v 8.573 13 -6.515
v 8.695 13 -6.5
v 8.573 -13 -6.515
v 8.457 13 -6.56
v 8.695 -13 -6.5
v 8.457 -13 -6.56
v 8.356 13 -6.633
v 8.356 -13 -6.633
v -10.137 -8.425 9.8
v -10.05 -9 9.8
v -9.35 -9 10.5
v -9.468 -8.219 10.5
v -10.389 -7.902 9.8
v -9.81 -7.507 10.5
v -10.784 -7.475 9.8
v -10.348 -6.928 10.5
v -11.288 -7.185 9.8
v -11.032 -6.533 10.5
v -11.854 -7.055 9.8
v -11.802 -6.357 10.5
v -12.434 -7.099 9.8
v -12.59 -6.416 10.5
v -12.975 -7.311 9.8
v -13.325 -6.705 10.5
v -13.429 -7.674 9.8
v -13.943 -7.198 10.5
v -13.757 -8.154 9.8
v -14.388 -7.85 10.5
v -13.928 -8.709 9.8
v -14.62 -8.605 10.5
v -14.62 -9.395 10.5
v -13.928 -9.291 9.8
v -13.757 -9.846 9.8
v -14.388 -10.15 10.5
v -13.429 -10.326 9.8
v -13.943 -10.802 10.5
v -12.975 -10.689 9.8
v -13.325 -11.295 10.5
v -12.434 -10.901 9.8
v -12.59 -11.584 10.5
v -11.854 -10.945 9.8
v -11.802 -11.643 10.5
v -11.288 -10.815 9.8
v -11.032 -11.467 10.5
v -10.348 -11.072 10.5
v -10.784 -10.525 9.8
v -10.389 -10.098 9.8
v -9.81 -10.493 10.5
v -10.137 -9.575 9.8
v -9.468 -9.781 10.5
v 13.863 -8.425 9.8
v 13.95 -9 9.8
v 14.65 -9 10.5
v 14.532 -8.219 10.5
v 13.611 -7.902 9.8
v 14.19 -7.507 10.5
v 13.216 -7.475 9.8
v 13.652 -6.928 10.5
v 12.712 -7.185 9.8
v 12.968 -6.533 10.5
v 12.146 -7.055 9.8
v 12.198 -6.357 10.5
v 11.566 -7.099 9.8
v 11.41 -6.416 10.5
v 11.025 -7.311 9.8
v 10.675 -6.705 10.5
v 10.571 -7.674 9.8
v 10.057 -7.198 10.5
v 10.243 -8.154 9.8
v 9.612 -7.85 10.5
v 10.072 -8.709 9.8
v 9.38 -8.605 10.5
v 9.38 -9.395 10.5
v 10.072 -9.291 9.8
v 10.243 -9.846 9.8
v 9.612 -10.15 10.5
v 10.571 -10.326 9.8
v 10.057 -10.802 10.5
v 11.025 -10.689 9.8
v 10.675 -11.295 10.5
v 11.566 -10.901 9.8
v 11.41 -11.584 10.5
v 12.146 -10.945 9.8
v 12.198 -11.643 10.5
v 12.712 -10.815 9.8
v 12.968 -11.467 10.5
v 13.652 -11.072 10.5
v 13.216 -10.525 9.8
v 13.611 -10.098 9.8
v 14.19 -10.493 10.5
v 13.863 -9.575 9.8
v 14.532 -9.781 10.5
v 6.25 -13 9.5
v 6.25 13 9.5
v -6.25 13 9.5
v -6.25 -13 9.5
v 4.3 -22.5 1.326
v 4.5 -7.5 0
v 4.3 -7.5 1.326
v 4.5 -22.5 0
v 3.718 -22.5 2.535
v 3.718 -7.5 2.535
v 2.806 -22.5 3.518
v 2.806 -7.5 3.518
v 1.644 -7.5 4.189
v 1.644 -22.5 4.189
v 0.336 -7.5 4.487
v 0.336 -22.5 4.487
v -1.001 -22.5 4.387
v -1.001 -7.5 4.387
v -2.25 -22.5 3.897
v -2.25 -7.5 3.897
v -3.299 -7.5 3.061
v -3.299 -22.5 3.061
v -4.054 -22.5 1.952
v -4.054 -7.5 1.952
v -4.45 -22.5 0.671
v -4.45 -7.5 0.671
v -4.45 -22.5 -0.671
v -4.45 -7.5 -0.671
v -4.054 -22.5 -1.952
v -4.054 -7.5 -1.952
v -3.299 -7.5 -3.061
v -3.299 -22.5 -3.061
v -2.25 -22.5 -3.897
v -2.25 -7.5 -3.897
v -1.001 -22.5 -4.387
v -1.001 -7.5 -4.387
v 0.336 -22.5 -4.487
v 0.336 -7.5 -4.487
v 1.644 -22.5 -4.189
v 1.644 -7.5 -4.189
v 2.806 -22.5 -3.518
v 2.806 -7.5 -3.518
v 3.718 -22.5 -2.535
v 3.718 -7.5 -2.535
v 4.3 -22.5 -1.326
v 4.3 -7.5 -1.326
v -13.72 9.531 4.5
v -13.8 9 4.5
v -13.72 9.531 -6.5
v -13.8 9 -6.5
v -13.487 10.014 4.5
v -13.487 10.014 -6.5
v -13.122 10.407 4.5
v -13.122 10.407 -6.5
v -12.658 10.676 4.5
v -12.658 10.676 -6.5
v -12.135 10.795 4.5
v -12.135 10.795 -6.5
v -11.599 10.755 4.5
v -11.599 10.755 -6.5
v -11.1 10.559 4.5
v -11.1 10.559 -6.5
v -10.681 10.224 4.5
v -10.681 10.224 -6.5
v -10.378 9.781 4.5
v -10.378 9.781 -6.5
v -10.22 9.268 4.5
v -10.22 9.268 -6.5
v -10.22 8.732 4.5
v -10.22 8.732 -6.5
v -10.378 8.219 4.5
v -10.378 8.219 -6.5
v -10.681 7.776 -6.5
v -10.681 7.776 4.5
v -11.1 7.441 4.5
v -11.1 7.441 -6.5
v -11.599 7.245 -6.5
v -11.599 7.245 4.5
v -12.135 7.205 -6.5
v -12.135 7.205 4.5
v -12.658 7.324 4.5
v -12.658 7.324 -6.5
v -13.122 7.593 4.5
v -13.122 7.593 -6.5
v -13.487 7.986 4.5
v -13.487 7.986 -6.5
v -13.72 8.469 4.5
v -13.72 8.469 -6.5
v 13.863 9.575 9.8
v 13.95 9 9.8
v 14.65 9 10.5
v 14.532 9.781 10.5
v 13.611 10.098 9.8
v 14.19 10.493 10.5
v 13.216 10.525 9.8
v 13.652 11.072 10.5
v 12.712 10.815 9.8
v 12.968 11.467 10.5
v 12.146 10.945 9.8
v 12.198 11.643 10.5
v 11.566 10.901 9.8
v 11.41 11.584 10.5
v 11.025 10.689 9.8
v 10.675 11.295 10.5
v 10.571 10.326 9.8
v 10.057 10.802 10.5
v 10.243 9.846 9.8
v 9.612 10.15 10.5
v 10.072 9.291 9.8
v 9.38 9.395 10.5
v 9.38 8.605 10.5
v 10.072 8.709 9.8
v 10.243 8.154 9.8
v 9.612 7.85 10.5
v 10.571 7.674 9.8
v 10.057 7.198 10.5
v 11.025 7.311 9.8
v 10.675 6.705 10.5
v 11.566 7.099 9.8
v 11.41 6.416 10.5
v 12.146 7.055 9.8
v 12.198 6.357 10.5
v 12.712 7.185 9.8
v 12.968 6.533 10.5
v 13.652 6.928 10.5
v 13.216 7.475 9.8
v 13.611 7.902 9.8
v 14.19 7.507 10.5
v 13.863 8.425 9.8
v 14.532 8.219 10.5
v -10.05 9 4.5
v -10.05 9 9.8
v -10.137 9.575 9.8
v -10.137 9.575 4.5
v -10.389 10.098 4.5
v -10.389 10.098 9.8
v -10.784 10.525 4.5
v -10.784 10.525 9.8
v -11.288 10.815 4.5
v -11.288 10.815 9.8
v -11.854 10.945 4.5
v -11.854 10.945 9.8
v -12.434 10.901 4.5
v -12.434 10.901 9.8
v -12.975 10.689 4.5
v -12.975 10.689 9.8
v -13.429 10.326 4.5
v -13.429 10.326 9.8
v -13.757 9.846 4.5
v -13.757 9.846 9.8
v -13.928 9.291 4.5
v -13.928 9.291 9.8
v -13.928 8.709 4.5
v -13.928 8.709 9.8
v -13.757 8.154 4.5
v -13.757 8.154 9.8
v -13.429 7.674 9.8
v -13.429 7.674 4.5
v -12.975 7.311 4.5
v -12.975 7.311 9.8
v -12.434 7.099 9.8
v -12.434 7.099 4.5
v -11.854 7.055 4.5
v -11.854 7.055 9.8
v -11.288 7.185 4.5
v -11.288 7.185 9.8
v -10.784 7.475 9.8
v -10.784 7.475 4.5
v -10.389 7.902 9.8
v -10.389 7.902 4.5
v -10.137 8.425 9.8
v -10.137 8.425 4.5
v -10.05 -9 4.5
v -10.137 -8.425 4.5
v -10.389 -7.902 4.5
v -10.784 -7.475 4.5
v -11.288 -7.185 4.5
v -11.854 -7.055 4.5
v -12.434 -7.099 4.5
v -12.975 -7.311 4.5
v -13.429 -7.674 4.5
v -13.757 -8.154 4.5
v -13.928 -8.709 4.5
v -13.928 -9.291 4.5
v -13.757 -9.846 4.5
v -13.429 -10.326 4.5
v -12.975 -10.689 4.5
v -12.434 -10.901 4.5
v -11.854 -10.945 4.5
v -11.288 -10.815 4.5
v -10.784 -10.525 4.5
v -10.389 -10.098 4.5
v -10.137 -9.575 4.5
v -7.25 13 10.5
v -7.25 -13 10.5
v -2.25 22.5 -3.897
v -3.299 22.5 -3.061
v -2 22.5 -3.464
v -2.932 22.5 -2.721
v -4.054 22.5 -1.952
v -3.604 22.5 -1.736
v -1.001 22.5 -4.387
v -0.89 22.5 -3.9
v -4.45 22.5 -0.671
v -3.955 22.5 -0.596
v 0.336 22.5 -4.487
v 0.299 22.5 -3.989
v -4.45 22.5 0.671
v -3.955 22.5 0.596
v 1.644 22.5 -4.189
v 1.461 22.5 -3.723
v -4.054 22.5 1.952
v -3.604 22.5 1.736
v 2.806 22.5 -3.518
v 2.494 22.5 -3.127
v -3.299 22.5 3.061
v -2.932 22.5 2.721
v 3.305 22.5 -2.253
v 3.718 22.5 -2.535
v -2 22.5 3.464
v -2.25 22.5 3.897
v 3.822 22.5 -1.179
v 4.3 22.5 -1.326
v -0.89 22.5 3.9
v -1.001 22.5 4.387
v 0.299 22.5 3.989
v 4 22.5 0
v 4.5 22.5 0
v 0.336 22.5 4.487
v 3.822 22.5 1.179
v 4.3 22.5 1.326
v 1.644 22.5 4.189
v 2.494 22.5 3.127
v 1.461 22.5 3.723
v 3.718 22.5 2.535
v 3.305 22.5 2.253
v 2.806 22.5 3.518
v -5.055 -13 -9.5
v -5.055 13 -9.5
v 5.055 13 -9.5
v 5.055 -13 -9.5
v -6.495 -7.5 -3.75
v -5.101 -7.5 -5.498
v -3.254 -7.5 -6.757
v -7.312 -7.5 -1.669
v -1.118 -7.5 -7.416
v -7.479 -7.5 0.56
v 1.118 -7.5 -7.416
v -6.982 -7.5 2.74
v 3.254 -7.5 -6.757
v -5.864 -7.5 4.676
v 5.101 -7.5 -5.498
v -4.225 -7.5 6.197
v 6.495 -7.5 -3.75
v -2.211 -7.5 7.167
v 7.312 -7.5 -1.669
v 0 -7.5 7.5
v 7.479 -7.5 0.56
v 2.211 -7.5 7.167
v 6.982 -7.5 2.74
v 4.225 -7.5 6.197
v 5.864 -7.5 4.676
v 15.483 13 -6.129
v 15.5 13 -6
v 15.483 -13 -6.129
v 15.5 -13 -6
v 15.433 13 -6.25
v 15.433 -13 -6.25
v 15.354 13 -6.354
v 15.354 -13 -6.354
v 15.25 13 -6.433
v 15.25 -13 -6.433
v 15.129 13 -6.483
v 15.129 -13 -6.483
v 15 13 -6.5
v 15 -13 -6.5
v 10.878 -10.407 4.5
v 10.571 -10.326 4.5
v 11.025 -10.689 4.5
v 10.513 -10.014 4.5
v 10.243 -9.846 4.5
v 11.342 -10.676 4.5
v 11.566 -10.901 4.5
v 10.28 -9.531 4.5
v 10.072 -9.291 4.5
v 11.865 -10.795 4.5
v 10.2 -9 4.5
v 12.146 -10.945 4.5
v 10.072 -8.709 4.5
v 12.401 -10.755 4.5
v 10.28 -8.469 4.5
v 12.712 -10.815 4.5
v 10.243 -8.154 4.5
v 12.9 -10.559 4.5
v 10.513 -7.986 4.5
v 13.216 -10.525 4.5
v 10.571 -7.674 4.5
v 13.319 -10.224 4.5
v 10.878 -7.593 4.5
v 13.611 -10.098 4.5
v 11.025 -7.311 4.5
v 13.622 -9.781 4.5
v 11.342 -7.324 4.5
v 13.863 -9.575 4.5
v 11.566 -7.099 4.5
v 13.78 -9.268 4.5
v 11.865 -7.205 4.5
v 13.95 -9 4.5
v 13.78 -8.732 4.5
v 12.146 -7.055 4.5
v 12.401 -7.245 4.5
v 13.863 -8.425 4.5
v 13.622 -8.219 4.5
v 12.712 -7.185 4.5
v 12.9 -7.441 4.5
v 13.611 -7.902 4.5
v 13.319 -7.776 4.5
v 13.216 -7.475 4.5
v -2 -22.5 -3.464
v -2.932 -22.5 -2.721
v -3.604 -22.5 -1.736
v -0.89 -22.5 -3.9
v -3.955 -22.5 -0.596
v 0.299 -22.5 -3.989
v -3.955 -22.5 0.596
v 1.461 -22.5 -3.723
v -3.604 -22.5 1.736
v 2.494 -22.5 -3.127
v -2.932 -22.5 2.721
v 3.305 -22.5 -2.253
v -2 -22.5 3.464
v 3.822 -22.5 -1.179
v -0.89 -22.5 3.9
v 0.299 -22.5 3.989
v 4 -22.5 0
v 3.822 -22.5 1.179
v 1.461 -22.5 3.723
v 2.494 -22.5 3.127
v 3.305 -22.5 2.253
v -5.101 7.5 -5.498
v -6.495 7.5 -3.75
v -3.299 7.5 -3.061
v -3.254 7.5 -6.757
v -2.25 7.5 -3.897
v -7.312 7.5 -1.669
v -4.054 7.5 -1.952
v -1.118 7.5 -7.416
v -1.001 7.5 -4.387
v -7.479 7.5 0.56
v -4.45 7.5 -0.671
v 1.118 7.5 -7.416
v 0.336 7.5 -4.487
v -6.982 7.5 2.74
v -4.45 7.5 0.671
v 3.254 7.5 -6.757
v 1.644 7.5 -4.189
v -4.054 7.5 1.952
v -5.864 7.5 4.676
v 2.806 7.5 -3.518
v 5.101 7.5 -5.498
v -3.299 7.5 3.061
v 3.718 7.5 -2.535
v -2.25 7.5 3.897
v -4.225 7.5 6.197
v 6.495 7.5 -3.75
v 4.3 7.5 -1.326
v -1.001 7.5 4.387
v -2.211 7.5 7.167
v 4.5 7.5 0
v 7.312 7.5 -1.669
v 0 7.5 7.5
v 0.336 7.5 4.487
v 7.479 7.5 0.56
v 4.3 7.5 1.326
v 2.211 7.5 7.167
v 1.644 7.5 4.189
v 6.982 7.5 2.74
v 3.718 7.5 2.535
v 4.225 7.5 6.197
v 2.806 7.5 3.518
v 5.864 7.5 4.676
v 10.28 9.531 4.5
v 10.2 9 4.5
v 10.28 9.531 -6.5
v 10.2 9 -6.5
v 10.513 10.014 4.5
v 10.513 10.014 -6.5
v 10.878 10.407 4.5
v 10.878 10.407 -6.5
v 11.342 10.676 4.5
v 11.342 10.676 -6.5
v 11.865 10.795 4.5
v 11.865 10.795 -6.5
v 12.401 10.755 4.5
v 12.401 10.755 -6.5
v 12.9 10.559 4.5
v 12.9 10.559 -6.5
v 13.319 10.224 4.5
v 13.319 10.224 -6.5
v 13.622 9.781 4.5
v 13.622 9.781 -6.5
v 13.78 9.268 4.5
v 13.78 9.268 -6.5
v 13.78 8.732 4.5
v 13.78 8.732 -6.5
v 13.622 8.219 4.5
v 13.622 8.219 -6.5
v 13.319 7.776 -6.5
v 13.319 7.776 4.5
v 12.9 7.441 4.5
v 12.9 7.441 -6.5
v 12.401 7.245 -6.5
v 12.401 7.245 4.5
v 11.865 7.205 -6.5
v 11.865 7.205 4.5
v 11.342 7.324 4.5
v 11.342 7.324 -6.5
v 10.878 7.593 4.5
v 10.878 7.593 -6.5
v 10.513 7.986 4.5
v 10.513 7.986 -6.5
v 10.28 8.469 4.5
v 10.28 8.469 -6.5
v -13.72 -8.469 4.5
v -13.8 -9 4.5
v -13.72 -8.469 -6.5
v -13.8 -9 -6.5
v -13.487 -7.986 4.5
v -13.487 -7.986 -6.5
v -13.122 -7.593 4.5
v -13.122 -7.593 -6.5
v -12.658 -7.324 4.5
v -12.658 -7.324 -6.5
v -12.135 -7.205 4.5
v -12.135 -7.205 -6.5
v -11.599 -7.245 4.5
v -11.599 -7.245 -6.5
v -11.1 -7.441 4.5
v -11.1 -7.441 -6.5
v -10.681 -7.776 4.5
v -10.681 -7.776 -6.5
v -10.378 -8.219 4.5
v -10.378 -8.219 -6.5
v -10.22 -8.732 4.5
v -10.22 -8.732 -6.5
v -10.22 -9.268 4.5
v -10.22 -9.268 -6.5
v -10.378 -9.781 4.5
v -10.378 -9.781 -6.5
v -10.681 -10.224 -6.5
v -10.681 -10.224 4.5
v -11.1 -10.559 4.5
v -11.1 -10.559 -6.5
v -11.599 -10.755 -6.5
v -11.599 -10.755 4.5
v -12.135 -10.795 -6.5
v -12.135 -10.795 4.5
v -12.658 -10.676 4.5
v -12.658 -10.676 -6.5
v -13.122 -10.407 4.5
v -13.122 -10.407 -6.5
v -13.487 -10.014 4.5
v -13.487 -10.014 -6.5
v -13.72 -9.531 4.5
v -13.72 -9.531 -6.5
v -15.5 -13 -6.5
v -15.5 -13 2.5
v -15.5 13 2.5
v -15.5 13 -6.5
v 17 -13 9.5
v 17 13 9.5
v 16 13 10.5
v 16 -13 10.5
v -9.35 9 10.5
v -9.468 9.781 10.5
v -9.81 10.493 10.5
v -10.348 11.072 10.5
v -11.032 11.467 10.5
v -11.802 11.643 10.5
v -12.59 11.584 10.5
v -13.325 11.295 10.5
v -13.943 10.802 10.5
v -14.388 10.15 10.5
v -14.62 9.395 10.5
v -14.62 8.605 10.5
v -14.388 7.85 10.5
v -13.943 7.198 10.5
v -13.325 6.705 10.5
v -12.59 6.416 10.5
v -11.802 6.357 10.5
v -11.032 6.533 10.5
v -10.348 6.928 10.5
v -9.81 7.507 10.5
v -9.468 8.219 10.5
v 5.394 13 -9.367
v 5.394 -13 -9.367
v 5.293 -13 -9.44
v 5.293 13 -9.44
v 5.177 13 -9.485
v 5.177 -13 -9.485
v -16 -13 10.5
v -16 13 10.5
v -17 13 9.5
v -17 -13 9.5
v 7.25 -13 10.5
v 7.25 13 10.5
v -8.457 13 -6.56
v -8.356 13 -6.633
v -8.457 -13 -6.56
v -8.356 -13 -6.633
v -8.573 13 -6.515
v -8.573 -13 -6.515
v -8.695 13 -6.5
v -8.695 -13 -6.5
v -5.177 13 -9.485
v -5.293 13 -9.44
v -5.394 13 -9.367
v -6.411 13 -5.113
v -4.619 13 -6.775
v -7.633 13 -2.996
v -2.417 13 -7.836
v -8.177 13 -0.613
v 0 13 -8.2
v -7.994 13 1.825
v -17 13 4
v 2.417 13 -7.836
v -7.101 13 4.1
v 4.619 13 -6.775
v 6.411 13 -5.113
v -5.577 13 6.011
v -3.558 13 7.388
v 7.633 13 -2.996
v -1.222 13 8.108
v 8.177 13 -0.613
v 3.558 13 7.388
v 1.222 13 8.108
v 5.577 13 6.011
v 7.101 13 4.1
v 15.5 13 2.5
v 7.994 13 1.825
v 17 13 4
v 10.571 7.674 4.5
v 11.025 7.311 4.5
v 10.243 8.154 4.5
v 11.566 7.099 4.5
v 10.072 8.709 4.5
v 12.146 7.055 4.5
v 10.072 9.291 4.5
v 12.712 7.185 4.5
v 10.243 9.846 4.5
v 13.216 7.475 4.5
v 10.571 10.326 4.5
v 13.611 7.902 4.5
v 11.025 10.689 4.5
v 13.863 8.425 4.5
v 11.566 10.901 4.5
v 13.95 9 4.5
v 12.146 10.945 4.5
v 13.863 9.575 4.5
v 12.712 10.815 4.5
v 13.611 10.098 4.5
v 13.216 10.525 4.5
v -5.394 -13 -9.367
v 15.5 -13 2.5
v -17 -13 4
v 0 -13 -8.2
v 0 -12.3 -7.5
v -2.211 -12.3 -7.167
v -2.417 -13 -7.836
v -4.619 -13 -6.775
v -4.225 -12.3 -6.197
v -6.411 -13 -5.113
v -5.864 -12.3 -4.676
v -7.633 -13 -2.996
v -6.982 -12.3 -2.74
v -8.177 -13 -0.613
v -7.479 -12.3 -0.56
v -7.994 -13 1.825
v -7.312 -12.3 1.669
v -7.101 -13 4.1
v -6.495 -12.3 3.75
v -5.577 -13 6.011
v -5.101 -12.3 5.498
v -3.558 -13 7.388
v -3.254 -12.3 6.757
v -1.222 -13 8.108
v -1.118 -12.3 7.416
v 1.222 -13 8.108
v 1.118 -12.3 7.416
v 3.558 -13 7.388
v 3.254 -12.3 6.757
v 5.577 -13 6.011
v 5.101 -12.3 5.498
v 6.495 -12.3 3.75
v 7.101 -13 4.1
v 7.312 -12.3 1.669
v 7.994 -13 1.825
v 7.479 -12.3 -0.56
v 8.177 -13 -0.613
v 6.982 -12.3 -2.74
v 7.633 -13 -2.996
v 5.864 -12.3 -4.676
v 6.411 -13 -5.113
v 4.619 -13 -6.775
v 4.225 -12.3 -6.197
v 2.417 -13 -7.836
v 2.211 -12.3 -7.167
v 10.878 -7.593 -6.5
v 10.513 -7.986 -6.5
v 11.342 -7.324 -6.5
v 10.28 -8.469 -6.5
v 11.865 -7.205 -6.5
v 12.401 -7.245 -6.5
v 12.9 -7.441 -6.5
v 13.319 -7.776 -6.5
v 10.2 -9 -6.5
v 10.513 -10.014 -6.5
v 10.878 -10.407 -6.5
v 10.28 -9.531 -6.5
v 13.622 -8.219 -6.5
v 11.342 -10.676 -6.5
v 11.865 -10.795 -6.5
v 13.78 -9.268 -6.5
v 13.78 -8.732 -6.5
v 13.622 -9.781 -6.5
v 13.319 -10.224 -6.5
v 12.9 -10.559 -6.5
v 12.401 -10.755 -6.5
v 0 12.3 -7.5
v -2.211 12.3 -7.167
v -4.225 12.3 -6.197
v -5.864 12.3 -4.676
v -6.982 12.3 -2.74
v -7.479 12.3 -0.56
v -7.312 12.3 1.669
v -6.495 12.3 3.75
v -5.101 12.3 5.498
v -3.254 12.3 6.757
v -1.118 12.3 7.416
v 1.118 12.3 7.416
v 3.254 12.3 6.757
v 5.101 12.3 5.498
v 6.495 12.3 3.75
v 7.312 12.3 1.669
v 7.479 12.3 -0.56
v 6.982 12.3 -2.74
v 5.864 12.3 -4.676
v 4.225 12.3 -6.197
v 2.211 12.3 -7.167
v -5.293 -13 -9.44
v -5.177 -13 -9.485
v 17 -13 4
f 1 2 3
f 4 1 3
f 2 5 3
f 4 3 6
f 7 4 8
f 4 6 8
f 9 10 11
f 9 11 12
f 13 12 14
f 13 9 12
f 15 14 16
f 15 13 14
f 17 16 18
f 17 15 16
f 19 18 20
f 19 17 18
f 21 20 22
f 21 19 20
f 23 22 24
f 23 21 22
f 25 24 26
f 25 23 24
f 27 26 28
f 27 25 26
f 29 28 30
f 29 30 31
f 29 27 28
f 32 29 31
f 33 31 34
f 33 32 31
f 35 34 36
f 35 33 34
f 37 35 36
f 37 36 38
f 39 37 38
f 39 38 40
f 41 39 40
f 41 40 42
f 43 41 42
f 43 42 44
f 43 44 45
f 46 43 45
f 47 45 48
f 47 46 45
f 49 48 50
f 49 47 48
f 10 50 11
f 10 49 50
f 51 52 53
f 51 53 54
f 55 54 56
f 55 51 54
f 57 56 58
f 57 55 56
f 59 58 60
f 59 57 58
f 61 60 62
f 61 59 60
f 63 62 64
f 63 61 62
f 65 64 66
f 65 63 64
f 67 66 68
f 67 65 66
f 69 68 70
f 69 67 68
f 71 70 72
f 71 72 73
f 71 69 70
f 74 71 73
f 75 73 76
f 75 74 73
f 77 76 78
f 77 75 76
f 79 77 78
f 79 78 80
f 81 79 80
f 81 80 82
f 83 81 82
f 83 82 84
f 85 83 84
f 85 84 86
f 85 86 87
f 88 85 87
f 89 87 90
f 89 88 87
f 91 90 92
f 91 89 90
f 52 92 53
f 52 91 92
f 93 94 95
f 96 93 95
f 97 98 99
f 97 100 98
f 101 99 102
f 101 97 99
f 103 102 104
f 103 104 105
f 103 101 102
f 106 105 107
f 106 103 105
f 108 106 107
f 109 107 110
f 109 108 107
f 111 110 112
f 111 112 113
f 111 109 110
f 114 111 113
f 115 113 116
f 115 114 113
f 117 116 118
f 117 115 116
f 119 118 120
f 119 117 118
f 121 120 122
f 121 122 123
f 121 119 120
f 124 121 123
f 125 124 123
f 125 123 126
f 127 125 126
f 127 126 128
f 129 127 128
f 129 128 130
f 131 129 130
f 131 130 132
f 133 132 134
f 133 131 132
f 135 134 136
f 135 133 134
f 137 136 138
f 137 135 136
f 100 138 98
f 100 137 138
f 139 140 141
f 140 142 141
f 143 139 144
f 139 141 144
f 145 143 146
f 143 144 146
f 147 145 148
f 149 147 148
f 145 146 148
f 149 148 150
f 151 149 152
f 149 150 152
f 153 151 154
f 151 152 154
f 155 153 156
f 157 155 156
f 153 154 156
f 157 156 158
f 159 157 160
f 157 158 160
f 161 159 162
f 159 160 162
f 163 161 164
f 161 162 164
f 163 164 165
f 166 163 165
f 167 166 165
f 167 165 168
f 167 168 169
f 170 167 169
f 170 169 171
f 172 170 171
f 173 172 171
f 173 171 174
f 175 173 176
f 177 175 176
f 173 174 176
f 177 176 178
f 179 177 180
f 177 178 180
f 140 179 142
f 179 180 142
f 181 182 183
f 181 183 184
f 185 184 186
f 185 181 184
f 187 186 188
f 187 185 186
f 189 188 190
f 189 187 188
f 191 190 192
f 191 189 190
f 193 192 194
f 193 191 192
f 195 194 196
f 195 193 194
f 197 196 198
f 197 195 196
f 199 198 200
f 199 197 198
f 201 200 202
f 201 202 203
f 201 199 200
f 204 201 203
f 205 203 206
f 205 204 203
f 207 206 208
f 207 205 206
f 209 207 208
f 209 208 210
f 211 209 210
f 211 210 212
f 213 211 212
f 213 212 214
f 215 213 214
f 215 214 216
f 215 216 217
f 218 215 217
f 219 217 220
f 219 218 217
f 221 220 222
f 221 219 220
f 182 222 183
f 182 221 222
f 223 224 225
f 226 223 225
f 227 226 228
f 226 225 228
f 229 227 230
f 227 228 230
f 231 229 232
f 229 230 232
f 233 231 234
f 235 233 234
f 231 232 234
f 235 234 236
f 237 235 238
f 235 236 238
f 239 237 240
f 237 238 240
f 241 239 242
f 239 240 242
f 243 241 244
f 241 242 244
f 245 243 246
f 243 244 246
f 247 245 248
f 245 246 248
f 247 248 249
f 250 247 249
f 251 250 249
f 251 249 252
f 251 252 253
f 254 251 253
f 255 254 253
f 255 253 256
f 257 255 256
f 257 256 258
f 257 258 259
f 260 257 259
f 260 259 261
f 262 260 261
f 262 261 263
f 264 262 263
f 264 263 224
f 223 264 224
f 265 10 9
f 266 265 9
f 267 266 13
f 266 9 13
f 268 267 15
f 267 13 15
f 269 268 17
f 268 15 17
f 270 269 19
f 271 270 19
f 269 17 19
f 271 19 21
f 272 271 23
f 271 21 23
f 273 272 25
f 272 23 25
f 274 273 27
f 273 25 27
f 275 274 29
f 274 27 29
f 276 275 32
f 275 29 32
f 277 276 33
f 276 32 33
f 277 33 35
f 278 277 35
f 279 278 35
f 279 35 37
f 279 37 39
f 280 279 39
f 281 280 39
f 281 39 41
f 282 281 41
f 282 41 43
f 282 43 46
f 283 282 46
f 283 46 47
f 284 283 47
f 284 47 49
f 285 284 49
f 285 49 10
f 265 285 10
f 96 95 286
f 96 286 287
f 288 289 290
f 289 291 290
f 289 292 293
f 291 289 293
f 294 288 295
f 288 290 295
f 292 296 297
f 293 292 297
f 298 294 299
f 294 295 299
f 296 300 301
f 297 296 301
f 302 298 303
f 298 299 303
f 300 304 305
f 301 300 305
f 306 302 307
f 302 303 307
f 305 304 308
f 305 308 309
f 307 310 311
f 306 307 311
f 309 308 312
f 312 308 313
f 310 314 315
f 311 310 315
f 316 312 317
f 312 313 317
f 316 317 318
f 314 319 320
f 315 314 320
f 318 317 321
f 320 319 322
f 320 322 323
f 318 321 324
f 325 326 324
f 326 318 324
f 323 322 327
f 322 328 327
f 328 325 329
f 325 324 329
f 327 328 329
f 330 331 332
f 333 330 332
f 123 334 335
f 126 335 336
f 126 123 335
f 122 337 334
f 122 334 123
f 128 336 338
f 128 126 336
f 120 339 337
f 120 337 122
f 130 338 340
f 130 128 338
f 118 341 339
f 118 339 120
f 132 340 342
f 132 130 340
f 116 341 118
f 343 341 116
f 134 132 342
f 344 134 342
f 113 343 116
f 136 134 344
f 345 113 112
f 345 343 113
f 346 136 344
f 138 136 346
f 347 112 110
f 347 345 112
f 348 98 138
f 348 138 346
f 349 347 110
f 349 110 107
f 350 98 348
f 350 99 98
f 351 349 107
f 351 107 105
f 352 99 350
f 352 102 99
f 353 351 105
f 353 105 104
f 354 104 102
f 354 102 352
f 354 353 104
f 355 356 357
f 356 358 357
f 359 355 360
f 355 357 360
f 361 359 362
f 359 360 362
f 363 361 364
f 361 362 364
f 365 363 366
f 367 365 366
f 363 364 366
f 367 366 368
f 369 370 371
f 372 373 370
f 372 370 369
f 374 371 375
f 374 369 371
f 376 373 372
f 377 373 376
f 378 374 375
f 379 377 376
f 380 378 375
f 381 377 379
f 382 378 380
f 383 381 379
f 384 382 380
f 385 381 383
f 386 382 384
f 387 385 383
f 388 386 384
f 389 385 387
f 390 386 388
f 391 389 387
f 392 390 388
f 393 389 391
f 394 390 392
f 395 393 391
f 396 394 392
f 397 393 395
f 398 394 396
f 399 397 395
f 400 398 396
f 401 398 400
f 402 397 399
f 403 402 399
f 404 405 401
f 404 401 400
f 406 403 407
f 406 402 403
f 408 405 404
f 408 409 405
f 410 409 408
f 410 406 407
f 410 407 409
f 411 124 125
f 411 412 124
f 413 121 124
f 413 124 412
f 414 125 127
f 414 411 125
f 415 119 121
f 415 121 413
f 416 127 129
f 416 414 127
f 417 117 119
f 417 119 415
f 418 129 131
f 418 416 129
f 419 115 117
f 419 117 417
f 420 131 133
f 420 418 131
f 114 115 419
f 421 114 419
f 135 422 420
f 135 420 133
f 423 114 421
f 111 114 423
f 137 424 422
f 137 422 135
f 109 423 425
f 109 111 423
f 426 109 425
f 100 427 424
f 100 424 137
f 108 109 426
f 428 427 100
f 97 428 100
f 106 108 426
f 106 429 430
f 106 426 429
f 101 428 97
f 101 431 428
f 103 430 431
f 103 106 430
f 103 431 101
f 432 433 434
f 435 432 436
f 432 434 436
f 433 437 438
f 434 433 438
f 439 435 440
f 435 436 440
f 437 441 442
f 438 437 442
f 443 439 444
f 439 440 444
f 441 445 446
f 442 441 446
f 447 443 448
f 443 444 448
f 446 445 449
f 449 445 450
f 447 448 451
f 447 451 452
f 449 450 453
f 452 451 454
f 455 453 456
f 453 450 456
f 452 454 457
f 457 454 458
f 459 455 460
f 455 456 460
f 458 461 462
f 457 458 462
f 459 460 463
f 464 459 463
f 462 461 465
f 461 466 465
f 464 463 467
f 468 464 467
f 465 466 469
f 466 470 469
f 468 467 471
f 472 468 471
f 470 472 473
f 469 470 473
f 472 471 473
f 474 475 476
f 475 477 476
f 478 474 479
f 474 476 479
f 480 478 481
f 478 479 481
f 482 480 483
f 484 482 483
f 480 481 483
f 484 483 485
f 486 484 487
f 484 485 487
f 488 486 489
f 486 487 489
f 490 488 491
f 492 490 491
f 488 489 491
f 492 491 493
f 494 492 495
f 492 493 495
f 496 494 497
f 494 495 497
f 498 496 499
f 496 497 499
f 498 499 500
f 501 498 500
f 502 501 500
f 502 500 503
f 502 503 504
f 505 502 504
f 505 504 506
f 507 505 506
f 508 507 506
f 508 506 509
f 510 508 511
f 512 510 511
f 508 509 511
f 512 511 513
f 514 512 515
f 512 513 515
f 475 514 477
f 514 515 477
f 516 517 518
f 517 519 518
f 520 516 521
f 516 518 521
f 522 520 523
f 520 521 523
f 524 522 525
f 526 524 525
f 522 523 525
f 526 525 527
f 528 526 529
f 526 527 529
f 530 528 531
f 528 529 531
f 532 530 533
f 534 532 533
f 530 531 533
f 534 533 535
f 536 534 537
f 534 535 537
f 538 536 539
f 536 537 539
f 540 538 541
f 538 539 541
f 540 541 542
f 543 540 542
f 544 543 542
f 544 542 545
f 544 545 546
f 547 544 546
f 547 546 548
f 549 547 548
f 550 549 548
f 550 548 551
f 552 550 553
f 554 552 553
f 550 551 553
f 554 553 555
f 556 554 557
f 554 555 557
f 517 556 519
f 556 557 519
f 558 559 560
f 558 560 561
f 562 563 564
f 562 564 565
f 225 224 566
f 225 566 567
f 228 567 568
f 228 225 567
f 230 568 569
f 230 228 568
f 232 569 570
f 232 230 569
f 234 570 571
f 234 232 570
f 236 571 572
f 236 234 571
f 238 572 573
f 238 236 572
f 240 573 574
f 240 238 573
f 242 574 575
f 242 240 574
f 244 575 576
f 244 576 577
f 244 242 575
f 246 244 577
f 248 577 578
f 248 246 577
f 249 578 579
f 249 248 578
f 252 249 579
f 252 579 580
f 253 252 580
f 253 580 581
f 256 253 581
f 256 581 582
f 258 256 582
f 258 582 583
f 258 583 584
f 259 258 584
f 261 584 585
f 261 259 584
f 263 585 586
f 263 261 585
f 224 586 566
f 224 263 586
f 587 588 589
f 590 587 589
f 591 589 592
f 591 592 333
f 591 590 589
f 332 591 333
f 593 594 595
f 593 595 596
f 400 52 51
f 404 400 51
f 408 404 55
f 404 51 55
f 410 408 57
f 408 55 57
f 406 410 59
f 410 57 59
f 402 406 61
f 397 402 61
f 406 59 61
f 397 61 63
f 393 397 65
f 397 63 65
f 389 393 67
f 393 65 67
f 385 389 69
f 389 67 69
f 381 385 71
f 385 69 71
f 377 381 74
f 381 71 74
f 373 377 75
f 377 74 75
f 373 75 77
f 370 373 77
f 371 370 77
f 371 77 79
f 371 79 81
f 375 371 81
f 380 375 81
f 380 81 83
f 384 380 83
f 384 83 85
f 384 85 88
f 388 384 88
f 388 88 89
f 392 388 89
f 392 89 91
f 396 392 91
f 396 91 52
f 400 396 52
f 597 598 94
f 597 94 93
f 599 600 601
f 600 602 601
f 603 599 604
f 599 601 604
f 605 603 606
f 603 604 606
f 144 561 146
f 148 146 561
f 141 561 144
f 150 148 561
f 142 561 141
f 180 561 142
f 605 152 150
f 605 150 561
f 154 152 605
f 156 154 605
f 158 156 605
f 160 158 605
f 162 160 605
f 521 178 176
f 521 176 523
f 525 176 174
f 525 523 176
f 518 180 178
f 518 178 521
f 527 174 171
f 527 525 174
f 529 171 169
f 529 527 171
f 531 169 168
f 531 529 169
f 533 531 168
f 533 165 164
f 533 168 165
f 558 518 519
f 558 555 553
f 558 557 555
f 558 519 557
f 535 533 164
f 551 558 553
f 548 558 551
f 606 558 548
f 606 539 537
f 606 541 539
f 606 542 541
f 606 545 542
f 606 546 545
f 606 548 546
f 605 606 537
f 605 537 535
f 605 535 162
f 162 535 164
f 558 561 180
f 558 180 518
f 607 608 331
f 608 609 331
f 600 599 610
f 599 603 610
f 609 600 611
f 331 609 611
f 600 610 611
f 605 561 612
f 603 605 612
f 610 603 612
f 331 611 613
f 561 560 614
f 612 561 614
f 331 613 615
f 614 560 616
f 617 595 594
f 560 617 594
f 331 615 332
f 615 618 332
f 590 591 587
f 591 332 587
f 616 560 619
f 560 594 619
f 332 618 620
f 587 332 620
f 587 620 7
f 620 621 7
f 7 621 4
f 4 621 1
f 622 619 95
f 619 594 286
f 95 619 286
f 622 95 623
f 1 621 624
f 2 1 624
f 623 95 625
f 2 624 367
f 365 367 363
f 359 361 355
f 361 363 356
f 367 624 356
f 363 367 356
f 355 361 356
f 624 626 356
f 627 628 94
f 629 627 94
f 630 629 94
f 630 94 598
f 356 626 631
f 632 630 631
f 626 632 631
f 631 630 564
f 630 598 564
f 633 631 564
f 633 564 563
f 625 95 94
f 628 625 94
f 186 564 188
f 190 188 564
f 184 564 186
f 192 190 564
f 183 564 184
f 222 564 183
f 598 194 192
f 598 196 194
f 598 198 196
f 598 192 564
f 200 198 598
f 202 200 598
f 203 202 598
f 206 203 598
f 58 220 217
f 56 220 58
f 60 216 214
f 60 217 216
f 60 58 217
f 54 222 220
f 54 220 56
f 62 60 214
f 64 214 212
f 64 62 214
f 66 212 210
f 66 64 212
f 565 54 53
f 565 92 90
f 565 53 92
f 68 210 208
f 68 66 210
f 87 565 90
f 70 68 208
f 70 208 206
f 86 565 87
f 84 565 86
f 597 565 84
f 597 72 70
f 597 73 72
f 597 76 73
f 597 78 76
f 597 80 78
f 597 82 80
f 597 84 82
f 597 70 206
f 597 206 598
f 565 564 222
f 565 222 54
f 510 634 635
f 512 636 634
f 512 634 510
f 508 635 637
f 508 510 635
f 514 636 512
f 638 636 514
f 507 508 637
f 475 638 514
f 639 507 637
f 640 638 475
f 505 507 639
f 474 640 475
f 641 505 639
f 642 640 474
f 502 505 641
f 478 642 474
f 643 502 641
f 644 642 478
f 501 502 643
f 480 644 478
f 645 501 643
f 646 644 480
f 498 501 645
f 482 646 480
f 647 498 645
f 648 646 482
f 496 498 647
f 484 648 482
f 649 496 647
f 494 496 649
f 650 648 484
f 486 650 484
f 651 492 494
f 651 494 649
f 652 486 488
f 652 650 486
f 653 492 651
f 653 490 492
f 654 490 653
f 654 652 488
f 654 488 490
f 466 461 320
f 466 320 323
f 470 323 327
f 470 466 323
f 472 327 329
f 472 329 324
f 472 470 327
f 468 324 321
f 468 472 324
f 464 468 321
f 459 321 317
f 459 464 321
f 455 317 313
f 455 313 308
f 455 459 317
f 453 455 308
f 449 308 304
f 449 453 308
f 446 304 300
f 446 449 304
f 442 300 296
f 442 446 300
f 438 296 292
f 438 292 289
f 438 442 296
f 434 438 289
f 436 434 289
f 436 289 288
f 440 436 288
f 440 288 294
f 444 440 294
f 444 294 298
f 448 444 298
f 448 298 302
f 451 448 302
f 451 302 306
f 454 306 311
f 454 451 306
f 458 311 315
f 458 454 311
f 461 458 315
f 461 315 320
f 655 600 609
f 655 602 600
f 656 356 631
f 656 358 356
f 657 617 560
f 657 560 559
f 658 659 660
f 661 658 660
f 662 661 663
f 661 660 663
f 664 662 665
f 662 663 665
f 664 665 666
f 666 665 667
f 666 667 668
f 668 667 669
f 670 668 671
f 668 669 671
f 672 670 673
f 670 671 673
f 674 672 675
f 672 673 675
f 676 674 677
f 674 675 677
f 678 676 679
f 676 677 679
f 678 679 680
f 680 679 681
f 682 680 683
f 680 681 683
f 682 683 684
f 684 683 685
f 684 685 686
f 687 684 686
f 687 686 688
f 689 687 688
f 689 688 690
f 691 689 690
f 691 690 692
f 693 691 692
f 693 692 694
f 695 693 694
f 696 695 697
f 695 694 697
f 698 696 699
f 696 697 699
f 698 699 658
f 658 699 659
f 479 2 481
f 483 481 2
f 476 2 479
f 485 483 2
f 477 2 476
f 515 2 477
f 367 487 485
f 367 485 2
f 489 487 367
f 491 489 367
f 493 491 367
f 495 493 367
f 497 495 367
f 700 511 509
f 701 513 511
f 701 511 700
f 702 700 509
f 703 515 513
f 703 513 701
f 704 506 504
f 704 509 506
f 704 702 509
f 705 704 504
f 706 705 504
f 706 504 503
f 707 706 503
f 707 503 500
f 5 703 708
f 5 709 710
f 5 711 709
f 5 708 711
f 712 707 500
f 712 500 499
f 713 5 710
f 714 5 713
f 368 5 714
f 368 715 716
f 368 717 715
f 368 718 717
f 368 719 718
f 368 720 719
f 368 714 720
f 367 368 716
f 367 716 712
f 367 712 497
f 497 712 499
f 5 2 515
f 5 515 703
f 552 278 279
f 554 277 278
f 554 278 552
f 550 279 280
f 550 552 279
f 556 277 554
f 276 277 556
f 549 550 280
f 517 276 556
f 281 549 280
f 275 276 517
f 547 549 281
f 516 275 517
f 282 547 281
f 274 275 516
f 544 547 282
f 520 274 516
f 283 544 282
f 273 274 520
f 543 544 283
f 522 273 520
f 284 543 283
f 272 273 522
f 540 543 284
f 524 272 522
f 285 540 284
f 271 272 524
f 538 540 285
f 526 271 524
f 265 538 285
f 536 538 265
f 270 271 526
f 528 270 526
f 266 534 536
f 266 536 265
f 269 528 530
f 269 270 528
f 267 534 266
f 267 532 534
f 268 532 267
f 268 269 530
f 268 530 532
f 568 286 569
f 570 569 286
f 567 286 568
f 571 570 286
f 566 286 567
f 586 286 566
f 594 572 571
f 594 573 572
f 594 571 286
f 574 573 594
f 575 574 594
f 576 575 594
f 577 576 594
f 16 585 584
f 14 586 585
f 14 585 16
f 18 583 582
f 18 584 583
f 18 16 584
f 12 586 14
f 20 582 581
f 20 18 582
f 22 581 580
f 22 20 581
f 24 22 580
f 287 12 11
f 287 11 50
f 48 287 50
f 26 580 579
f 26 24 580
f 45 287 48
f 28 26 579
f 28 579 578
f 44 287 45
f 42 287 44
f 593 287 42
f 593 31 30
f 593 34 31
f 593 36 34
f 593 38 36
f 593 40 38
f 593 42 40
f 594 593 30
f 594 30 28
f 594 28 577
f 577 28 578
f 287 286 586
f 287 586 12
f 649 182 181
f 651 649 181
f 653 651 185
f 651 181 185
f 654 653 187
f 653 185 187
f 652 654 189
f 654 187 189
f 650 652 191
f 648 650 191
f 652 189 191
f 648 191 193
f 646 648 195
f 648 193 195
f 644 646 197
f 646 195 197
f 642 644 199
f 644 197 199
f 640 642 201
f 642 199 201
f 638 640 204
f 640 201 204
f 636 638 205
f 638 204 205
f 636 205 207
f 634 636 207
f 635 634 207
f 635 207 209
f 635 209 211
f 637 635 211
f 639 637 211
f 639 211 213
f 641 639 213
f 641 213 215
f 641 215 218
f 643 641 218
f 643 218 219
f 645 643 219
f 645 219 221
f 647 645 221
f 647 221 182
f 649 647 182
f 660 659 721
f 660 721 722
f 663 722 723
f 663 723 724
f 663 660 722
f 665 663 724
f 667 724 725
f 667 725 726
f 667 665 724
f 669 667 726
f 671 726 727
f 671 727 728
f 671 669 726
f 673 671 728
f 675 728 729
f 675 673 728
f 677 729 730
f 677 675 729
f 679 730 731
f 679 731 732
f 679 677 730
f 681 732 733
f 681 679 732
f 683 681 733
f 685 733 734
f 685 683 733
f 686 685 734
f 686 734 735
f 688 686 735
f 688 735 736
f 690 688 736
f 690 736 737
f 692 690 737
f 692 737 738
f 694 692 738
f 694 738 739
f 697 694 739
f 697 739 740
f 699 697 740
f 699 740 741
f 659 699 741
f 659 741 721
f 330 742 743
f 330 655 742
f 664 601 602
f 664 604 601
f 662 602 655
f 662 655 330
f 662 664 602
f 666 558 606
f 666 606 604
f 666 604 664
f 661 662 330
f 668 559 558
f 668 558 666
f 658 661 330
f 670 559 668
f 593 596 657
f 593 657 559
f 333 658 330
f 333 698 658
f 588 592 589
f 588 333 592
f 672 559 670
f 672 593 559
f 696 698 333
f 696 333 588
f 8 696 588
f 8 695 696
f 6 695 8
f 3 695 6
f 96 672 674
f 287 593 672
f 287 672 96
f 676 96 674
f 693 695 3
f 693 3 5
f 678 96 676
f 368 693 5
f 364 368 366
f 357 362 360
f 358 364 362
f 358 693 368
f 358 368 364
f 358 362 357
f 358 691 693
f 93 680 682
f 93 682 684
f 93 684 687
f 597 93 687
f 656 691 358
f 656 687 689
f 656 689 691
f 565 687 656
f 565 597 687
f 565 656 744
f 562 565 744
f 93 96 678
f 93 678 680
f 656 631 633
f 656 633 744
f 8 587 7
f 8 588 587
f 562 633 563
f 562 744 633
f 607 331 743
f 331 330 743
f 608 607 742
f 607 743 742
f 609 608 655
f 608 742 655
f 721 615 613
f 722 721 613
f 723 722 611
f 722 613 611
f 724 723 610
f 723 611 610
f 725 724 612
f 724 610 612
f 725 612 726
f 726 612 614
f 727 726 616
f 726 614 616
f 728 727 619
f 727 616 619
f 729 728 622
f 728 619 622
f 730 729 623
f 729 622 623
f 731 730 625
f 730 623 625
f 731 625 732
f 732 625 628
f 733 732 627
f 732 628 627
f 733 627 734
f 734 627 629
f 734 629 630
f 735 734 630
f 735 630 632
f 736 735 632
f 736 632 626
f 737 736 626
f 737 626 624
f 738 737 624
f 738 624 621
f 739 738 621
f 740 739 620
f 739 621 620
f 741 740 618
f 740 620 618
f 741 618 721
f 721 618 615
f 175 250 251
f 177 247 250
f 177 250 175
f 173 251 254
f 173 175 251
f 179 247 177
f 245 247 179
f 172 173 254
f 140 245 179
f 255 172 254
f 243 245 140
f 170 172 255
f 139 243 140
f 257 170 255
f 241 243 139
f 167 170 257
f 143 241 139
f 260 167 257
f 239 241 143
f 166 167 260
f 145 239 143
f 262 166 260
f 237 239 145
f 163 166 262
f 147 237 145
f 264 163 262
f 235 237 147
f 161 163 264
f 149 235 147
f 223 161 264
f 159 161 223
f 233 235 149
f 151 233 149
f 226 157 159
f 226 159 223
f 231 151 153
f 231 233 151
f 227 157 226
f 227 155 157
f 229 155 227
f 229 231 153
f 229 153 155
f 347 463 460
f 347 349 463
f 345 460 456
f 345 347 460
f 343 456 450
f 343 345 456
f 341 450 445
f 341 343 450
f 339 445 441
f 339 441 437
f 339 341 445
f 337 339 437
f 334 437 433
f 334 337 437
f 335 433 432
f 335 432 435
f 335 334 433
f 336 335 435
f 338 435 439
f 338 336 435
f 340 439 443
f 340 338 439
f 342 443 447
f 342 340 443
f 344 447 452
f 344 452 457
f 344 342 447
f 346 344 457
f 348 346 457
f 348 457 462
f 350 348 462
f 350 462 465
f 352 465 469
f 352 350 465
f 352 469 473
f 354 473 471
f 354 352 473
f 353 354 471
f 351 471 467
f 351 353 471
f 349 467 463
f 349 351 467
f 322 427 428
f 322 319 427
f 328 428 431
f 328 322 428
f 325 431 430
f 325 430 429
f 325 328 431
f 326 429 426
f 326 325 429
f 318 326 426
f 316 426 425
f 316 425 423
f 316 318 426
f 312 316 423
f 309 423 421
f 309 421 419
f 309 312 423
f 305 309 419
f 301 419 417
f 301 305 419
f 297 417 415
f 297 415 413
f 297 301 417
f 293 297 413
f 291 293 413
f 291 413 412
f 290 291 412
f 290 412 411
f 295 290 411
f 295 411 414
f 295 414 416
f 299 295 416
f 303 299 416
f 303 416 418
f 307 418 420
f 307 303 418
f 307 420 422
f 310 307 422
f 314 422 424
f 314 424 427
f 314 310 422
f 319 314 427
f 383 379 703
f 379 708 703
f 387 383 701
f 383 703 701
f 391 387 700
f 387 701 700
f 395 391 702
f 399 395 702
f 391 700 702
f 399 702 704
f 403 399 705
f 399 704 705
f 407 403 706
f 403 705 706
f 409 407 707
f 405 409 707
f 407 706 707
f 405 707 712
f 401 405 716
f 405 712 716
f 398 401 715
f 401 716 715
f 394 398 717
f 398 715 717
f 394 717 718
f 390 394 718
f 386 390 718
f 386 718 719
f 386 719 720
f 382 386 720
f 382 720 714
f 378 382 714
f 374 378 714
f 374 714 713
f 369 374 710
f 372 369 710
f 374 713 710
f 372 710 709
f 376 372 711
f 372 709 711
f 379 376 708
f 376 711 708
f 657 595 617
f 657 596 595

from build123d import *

# Parameters (mm, degrees)
F1_DEPTH       = 13
F2_SIZE        = 0.99999
F3_SIZE        = 1.49999
F4_R           = 0.5
F6_D           = 3.6
F6_CBORE_D     = 3.9
F6_CBORE_DEPTH = 6
F7_SIZE        = 0.7
F0_R           = 4.5
F8_DEPTH       = 7.5
F0_R_2         = 4
F9_DEPTH       = 22.5


# Not quite as in the source:
# - a fillet or chamfer is up to 0.001 mm smaller than in the source, because OpenCascade refuses the exact size


with BuildPart() as f1:
    # F0 (on Front) → F1 (new body, symmetric)
    with BuildSketch(Plane.XZ):
        with BuildLine():
            ThreePointArc((0, 7.5), (5.3033008589, 5.3033008589), (7.5, 0))
            ThreePointArc((7.5, 0), (5.3033008589, -5.3033008589), (0, -7.5))
            Line((0, -7.5), (0, -9.5))
            Line((0, -9.5), (5.25, -9.5))
            Line((5.25, -9.5), (8.5, -6.5))
            Line((8.5, -6.5), (15.5, -6.5))
            Line((15.5, -6.5), (15.5, 2.5))
            Line((15.5, 2.5), (17, 2.5))
            Line((17, 2.5), (17, 10.5))
            Line((17, 10.5), (7.25, 10.5))
            Line((7.25, 10.5), (7.25, 9.5))
            Line((7.25, 9.5), (0, 9.5))
            Line((0, 9.5), (0, 7.5))
        make_face()
        with BuildLine():
            ThreePointArc((0, -7.5), (-7.5, 0), (0, 7.5))
            Line((0, 7.5), (0, 9.5))
            Line((0, 9.5), (-7.25, 9.5))
            Line((-7.25, 9.5), (-7.25, 10.5))
            Line((-7.25, 10.5), (-17, 10.5))
            Line((-17, 10.5), (-17, 2.5))
            Line((-17, 2.5), (-15.5, 2.5))
            Line((-15.5, 2.5), (-15.5, -6.5))
            Line((-15.5, -6.5), (-8.5, -6.5))
            Line((-8.5, -6.5), (-5.25, -9.5))
            Line((-5.25, -9.5), (0, -9.5))
            Line((0, -9.5), (0, -7.5))
        make_face()
    extrude(amount=F1_DEPTH, both=True)

    # F2 (size 1 in the source; OpenCascade refuses exactly that, so slightly less here)
    f2_edges = [f1.edges().sort_by_distance(p)[0] for p in [
        (7.25, 0, 9.5),
        (17, 0, 10.5),
        (-7.25, 0, 9.5),
        (-17, 0, 10.5),
    ]]
    chamfer(f2_edges, length=F2_SIZE)

    # F3 (size 1.5 in the source; OpenCascade refuses exactly that, so slightly less here)
    f3_edges = [f1.edges().sort_by_distance(p)[0] for p in [
        (17, 0, 2.5),
        (-17, 0, 2.5),
    ]]
    chamfer(f3_edges, length=F3_SIZE)

    # F4
    f4_edges = [f1.edges().sort_by_distance(p)[0] for p in [
        (15.5, 0, -6.5),
        (8.5, 0, -6.5),
        (5.25, 0, -9.5),
        (-5.25, 0, -9.5),
        (-8.5, 0, -6.5),
    ]]
    fillet(f4_edges, radius=F4_R)

    # F6 (through all)
    with Locations(Plane.XY.offset(10.5)):
        with Locations((12, 9), (12, -9), (-12, 9), (-12, -9)):
            CounterBoreHole(F6_D / 2, F6_CBORE_D / 2, F6_CBORE_DEPTH)

    # F7
    f7_edges = [f1.edges().sort_by_distance(p)[0] for p in [
        (-7.5, -13, 0),
        (-7.5, 13, 0),
        (10.05, 9, 10.5),
        (10.05, -9, 10.5),
        (-13.95, 9, 10.5),
        (-13.95, -9, 10.5),
    ]]
    chamfer(f7_edges, length=F7_SIZE)


with BuildPart() as f8:
    # F0 (on Front) → F8 (new body, symmetric)
    with BuildSketch(Plane.XZ):
        with BuildLine():
            ThreePointArc((0, -7.5), (5.3033008589, -5.3033008589), (7.5, 0))
            ThreePointArc((7.5, 0), (5.3033008589, 5.3033008589), (0, 7.5))
            ThreePointArc((0, 7.5), (-7.5, 0), (0, -7.5))
        make_face()
        Circle(F0_R, mode=Mode.SUBTRACT)
    extrude(amount=F8_DEPTH, both=True)

    # F0 (on Front) → F9 (join, symmetric)
    with BuildSketch(Plane.XZ):
        Circle(F0_R)
        Circle(F0_R_2, mode=Mode.SUBTRACT)
    extrude(amount=F9_DEPTH, both=True)


solid = Compound([f1.part, f8.part])
